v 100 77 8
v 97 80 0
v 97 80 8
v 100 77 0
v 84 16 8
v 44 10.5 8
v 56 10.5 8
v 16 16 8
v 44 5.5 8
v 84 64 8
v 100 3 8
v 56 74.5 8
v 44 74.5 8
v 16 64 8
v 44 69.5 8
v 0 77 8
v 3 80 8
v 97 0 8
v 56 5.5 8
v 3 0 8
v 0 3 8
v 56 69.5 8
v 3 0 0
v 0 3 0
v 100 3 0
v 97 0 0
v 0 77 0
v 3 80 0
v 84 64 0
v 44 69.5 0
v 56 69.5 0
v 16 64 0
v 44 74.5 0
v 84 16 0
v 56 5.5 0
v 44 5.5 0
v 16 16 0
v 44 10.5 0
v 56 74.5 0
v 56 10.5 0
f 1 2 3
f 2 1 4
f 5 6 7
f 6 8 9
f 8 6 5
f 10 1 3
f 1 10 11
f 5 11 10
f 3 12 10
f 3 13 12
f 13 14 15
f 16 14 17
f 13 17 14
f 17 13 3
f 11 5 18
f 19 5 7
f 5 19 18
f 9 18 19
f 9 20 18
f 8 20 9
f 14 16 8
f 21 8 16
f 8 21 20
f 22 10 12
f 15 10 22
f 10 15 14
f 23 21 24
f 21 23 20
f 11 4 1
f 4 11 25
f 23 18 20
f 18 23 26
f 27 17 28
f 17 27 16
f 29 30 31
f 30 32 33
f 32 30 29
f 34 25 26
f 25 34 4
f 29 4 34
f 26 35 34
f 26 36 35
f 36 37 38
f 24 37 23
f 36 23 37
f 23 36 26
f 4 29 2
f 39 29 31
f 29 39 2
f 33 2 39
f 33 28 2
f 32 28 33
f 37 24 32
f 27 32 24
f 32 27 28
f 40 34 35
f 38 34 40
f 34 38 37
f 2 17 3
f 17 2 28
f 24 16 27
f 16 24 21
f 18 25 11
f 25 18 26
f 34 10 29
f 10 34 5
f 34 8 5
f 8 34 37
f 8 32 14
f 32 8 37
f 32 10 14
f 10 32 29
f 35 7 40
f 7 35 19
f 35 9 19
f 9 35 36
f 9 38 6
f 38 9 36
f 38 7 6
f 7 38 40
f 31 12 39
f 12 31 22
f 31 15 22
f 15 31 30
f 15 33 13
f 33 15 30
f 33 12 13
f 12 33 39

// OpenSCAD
$fn = 32;

// ----------------------------------------------------------------------
// Frame plate: 100 x 80 frame, 16 mm rails
// ----------------------------------------------------------------------

// --- parameters (mm) ---
plate_l = 100;            // plate length, X
plate_w = 80;             // plate width, Y
plate_t = 8;              // plate thickness, Z (extrusion height)
corner_c = 3;             // corner chamfer
frame_bar = 16;           // frame rail width
slot_l = 12;              // adjustment slot length
slot_w = 5;               // adjustment slot width

win_l = plate_l - 2 * frame_bar;  // window length
win_w = plate_w - 2 * frame_bar;  // window width

profile = [[3, 0], [97, 0], [100, 3], [100, 77], [97, 80], [3, 80], [0, 77], [0, 3]];  // primary outline, 8 points, counter clockwise
void_1 = [[16, 16], [84, 16], [84, 64], [16, 64]];  // the window, 4 points
void_2 = [[44, 5.5], [56, 5.5], [56, 10.5], [44, 10.5]];  // adjustment slot, 4 points
void_3 = [[44, 69.5], [56, 69.5], [56, 74.5], [44, 74.5]];  // adjustment slot, 4 points

// --- the one profile operation ---
difference() {
  linear_extrude(height = plate_t) polygon(points = profile);
  translate([0, 0, -1])
    linear_extrude(height = plate_t + 2) polygon(points = void_1);
  translate([0, 0, -1])
    linear_extrude(height = plate_t + 2) polygon(points = void_2);
  translate([0, 0, -1])
    linear_extrude(height = plate_t + 2) polygon(points = void_3);
}
